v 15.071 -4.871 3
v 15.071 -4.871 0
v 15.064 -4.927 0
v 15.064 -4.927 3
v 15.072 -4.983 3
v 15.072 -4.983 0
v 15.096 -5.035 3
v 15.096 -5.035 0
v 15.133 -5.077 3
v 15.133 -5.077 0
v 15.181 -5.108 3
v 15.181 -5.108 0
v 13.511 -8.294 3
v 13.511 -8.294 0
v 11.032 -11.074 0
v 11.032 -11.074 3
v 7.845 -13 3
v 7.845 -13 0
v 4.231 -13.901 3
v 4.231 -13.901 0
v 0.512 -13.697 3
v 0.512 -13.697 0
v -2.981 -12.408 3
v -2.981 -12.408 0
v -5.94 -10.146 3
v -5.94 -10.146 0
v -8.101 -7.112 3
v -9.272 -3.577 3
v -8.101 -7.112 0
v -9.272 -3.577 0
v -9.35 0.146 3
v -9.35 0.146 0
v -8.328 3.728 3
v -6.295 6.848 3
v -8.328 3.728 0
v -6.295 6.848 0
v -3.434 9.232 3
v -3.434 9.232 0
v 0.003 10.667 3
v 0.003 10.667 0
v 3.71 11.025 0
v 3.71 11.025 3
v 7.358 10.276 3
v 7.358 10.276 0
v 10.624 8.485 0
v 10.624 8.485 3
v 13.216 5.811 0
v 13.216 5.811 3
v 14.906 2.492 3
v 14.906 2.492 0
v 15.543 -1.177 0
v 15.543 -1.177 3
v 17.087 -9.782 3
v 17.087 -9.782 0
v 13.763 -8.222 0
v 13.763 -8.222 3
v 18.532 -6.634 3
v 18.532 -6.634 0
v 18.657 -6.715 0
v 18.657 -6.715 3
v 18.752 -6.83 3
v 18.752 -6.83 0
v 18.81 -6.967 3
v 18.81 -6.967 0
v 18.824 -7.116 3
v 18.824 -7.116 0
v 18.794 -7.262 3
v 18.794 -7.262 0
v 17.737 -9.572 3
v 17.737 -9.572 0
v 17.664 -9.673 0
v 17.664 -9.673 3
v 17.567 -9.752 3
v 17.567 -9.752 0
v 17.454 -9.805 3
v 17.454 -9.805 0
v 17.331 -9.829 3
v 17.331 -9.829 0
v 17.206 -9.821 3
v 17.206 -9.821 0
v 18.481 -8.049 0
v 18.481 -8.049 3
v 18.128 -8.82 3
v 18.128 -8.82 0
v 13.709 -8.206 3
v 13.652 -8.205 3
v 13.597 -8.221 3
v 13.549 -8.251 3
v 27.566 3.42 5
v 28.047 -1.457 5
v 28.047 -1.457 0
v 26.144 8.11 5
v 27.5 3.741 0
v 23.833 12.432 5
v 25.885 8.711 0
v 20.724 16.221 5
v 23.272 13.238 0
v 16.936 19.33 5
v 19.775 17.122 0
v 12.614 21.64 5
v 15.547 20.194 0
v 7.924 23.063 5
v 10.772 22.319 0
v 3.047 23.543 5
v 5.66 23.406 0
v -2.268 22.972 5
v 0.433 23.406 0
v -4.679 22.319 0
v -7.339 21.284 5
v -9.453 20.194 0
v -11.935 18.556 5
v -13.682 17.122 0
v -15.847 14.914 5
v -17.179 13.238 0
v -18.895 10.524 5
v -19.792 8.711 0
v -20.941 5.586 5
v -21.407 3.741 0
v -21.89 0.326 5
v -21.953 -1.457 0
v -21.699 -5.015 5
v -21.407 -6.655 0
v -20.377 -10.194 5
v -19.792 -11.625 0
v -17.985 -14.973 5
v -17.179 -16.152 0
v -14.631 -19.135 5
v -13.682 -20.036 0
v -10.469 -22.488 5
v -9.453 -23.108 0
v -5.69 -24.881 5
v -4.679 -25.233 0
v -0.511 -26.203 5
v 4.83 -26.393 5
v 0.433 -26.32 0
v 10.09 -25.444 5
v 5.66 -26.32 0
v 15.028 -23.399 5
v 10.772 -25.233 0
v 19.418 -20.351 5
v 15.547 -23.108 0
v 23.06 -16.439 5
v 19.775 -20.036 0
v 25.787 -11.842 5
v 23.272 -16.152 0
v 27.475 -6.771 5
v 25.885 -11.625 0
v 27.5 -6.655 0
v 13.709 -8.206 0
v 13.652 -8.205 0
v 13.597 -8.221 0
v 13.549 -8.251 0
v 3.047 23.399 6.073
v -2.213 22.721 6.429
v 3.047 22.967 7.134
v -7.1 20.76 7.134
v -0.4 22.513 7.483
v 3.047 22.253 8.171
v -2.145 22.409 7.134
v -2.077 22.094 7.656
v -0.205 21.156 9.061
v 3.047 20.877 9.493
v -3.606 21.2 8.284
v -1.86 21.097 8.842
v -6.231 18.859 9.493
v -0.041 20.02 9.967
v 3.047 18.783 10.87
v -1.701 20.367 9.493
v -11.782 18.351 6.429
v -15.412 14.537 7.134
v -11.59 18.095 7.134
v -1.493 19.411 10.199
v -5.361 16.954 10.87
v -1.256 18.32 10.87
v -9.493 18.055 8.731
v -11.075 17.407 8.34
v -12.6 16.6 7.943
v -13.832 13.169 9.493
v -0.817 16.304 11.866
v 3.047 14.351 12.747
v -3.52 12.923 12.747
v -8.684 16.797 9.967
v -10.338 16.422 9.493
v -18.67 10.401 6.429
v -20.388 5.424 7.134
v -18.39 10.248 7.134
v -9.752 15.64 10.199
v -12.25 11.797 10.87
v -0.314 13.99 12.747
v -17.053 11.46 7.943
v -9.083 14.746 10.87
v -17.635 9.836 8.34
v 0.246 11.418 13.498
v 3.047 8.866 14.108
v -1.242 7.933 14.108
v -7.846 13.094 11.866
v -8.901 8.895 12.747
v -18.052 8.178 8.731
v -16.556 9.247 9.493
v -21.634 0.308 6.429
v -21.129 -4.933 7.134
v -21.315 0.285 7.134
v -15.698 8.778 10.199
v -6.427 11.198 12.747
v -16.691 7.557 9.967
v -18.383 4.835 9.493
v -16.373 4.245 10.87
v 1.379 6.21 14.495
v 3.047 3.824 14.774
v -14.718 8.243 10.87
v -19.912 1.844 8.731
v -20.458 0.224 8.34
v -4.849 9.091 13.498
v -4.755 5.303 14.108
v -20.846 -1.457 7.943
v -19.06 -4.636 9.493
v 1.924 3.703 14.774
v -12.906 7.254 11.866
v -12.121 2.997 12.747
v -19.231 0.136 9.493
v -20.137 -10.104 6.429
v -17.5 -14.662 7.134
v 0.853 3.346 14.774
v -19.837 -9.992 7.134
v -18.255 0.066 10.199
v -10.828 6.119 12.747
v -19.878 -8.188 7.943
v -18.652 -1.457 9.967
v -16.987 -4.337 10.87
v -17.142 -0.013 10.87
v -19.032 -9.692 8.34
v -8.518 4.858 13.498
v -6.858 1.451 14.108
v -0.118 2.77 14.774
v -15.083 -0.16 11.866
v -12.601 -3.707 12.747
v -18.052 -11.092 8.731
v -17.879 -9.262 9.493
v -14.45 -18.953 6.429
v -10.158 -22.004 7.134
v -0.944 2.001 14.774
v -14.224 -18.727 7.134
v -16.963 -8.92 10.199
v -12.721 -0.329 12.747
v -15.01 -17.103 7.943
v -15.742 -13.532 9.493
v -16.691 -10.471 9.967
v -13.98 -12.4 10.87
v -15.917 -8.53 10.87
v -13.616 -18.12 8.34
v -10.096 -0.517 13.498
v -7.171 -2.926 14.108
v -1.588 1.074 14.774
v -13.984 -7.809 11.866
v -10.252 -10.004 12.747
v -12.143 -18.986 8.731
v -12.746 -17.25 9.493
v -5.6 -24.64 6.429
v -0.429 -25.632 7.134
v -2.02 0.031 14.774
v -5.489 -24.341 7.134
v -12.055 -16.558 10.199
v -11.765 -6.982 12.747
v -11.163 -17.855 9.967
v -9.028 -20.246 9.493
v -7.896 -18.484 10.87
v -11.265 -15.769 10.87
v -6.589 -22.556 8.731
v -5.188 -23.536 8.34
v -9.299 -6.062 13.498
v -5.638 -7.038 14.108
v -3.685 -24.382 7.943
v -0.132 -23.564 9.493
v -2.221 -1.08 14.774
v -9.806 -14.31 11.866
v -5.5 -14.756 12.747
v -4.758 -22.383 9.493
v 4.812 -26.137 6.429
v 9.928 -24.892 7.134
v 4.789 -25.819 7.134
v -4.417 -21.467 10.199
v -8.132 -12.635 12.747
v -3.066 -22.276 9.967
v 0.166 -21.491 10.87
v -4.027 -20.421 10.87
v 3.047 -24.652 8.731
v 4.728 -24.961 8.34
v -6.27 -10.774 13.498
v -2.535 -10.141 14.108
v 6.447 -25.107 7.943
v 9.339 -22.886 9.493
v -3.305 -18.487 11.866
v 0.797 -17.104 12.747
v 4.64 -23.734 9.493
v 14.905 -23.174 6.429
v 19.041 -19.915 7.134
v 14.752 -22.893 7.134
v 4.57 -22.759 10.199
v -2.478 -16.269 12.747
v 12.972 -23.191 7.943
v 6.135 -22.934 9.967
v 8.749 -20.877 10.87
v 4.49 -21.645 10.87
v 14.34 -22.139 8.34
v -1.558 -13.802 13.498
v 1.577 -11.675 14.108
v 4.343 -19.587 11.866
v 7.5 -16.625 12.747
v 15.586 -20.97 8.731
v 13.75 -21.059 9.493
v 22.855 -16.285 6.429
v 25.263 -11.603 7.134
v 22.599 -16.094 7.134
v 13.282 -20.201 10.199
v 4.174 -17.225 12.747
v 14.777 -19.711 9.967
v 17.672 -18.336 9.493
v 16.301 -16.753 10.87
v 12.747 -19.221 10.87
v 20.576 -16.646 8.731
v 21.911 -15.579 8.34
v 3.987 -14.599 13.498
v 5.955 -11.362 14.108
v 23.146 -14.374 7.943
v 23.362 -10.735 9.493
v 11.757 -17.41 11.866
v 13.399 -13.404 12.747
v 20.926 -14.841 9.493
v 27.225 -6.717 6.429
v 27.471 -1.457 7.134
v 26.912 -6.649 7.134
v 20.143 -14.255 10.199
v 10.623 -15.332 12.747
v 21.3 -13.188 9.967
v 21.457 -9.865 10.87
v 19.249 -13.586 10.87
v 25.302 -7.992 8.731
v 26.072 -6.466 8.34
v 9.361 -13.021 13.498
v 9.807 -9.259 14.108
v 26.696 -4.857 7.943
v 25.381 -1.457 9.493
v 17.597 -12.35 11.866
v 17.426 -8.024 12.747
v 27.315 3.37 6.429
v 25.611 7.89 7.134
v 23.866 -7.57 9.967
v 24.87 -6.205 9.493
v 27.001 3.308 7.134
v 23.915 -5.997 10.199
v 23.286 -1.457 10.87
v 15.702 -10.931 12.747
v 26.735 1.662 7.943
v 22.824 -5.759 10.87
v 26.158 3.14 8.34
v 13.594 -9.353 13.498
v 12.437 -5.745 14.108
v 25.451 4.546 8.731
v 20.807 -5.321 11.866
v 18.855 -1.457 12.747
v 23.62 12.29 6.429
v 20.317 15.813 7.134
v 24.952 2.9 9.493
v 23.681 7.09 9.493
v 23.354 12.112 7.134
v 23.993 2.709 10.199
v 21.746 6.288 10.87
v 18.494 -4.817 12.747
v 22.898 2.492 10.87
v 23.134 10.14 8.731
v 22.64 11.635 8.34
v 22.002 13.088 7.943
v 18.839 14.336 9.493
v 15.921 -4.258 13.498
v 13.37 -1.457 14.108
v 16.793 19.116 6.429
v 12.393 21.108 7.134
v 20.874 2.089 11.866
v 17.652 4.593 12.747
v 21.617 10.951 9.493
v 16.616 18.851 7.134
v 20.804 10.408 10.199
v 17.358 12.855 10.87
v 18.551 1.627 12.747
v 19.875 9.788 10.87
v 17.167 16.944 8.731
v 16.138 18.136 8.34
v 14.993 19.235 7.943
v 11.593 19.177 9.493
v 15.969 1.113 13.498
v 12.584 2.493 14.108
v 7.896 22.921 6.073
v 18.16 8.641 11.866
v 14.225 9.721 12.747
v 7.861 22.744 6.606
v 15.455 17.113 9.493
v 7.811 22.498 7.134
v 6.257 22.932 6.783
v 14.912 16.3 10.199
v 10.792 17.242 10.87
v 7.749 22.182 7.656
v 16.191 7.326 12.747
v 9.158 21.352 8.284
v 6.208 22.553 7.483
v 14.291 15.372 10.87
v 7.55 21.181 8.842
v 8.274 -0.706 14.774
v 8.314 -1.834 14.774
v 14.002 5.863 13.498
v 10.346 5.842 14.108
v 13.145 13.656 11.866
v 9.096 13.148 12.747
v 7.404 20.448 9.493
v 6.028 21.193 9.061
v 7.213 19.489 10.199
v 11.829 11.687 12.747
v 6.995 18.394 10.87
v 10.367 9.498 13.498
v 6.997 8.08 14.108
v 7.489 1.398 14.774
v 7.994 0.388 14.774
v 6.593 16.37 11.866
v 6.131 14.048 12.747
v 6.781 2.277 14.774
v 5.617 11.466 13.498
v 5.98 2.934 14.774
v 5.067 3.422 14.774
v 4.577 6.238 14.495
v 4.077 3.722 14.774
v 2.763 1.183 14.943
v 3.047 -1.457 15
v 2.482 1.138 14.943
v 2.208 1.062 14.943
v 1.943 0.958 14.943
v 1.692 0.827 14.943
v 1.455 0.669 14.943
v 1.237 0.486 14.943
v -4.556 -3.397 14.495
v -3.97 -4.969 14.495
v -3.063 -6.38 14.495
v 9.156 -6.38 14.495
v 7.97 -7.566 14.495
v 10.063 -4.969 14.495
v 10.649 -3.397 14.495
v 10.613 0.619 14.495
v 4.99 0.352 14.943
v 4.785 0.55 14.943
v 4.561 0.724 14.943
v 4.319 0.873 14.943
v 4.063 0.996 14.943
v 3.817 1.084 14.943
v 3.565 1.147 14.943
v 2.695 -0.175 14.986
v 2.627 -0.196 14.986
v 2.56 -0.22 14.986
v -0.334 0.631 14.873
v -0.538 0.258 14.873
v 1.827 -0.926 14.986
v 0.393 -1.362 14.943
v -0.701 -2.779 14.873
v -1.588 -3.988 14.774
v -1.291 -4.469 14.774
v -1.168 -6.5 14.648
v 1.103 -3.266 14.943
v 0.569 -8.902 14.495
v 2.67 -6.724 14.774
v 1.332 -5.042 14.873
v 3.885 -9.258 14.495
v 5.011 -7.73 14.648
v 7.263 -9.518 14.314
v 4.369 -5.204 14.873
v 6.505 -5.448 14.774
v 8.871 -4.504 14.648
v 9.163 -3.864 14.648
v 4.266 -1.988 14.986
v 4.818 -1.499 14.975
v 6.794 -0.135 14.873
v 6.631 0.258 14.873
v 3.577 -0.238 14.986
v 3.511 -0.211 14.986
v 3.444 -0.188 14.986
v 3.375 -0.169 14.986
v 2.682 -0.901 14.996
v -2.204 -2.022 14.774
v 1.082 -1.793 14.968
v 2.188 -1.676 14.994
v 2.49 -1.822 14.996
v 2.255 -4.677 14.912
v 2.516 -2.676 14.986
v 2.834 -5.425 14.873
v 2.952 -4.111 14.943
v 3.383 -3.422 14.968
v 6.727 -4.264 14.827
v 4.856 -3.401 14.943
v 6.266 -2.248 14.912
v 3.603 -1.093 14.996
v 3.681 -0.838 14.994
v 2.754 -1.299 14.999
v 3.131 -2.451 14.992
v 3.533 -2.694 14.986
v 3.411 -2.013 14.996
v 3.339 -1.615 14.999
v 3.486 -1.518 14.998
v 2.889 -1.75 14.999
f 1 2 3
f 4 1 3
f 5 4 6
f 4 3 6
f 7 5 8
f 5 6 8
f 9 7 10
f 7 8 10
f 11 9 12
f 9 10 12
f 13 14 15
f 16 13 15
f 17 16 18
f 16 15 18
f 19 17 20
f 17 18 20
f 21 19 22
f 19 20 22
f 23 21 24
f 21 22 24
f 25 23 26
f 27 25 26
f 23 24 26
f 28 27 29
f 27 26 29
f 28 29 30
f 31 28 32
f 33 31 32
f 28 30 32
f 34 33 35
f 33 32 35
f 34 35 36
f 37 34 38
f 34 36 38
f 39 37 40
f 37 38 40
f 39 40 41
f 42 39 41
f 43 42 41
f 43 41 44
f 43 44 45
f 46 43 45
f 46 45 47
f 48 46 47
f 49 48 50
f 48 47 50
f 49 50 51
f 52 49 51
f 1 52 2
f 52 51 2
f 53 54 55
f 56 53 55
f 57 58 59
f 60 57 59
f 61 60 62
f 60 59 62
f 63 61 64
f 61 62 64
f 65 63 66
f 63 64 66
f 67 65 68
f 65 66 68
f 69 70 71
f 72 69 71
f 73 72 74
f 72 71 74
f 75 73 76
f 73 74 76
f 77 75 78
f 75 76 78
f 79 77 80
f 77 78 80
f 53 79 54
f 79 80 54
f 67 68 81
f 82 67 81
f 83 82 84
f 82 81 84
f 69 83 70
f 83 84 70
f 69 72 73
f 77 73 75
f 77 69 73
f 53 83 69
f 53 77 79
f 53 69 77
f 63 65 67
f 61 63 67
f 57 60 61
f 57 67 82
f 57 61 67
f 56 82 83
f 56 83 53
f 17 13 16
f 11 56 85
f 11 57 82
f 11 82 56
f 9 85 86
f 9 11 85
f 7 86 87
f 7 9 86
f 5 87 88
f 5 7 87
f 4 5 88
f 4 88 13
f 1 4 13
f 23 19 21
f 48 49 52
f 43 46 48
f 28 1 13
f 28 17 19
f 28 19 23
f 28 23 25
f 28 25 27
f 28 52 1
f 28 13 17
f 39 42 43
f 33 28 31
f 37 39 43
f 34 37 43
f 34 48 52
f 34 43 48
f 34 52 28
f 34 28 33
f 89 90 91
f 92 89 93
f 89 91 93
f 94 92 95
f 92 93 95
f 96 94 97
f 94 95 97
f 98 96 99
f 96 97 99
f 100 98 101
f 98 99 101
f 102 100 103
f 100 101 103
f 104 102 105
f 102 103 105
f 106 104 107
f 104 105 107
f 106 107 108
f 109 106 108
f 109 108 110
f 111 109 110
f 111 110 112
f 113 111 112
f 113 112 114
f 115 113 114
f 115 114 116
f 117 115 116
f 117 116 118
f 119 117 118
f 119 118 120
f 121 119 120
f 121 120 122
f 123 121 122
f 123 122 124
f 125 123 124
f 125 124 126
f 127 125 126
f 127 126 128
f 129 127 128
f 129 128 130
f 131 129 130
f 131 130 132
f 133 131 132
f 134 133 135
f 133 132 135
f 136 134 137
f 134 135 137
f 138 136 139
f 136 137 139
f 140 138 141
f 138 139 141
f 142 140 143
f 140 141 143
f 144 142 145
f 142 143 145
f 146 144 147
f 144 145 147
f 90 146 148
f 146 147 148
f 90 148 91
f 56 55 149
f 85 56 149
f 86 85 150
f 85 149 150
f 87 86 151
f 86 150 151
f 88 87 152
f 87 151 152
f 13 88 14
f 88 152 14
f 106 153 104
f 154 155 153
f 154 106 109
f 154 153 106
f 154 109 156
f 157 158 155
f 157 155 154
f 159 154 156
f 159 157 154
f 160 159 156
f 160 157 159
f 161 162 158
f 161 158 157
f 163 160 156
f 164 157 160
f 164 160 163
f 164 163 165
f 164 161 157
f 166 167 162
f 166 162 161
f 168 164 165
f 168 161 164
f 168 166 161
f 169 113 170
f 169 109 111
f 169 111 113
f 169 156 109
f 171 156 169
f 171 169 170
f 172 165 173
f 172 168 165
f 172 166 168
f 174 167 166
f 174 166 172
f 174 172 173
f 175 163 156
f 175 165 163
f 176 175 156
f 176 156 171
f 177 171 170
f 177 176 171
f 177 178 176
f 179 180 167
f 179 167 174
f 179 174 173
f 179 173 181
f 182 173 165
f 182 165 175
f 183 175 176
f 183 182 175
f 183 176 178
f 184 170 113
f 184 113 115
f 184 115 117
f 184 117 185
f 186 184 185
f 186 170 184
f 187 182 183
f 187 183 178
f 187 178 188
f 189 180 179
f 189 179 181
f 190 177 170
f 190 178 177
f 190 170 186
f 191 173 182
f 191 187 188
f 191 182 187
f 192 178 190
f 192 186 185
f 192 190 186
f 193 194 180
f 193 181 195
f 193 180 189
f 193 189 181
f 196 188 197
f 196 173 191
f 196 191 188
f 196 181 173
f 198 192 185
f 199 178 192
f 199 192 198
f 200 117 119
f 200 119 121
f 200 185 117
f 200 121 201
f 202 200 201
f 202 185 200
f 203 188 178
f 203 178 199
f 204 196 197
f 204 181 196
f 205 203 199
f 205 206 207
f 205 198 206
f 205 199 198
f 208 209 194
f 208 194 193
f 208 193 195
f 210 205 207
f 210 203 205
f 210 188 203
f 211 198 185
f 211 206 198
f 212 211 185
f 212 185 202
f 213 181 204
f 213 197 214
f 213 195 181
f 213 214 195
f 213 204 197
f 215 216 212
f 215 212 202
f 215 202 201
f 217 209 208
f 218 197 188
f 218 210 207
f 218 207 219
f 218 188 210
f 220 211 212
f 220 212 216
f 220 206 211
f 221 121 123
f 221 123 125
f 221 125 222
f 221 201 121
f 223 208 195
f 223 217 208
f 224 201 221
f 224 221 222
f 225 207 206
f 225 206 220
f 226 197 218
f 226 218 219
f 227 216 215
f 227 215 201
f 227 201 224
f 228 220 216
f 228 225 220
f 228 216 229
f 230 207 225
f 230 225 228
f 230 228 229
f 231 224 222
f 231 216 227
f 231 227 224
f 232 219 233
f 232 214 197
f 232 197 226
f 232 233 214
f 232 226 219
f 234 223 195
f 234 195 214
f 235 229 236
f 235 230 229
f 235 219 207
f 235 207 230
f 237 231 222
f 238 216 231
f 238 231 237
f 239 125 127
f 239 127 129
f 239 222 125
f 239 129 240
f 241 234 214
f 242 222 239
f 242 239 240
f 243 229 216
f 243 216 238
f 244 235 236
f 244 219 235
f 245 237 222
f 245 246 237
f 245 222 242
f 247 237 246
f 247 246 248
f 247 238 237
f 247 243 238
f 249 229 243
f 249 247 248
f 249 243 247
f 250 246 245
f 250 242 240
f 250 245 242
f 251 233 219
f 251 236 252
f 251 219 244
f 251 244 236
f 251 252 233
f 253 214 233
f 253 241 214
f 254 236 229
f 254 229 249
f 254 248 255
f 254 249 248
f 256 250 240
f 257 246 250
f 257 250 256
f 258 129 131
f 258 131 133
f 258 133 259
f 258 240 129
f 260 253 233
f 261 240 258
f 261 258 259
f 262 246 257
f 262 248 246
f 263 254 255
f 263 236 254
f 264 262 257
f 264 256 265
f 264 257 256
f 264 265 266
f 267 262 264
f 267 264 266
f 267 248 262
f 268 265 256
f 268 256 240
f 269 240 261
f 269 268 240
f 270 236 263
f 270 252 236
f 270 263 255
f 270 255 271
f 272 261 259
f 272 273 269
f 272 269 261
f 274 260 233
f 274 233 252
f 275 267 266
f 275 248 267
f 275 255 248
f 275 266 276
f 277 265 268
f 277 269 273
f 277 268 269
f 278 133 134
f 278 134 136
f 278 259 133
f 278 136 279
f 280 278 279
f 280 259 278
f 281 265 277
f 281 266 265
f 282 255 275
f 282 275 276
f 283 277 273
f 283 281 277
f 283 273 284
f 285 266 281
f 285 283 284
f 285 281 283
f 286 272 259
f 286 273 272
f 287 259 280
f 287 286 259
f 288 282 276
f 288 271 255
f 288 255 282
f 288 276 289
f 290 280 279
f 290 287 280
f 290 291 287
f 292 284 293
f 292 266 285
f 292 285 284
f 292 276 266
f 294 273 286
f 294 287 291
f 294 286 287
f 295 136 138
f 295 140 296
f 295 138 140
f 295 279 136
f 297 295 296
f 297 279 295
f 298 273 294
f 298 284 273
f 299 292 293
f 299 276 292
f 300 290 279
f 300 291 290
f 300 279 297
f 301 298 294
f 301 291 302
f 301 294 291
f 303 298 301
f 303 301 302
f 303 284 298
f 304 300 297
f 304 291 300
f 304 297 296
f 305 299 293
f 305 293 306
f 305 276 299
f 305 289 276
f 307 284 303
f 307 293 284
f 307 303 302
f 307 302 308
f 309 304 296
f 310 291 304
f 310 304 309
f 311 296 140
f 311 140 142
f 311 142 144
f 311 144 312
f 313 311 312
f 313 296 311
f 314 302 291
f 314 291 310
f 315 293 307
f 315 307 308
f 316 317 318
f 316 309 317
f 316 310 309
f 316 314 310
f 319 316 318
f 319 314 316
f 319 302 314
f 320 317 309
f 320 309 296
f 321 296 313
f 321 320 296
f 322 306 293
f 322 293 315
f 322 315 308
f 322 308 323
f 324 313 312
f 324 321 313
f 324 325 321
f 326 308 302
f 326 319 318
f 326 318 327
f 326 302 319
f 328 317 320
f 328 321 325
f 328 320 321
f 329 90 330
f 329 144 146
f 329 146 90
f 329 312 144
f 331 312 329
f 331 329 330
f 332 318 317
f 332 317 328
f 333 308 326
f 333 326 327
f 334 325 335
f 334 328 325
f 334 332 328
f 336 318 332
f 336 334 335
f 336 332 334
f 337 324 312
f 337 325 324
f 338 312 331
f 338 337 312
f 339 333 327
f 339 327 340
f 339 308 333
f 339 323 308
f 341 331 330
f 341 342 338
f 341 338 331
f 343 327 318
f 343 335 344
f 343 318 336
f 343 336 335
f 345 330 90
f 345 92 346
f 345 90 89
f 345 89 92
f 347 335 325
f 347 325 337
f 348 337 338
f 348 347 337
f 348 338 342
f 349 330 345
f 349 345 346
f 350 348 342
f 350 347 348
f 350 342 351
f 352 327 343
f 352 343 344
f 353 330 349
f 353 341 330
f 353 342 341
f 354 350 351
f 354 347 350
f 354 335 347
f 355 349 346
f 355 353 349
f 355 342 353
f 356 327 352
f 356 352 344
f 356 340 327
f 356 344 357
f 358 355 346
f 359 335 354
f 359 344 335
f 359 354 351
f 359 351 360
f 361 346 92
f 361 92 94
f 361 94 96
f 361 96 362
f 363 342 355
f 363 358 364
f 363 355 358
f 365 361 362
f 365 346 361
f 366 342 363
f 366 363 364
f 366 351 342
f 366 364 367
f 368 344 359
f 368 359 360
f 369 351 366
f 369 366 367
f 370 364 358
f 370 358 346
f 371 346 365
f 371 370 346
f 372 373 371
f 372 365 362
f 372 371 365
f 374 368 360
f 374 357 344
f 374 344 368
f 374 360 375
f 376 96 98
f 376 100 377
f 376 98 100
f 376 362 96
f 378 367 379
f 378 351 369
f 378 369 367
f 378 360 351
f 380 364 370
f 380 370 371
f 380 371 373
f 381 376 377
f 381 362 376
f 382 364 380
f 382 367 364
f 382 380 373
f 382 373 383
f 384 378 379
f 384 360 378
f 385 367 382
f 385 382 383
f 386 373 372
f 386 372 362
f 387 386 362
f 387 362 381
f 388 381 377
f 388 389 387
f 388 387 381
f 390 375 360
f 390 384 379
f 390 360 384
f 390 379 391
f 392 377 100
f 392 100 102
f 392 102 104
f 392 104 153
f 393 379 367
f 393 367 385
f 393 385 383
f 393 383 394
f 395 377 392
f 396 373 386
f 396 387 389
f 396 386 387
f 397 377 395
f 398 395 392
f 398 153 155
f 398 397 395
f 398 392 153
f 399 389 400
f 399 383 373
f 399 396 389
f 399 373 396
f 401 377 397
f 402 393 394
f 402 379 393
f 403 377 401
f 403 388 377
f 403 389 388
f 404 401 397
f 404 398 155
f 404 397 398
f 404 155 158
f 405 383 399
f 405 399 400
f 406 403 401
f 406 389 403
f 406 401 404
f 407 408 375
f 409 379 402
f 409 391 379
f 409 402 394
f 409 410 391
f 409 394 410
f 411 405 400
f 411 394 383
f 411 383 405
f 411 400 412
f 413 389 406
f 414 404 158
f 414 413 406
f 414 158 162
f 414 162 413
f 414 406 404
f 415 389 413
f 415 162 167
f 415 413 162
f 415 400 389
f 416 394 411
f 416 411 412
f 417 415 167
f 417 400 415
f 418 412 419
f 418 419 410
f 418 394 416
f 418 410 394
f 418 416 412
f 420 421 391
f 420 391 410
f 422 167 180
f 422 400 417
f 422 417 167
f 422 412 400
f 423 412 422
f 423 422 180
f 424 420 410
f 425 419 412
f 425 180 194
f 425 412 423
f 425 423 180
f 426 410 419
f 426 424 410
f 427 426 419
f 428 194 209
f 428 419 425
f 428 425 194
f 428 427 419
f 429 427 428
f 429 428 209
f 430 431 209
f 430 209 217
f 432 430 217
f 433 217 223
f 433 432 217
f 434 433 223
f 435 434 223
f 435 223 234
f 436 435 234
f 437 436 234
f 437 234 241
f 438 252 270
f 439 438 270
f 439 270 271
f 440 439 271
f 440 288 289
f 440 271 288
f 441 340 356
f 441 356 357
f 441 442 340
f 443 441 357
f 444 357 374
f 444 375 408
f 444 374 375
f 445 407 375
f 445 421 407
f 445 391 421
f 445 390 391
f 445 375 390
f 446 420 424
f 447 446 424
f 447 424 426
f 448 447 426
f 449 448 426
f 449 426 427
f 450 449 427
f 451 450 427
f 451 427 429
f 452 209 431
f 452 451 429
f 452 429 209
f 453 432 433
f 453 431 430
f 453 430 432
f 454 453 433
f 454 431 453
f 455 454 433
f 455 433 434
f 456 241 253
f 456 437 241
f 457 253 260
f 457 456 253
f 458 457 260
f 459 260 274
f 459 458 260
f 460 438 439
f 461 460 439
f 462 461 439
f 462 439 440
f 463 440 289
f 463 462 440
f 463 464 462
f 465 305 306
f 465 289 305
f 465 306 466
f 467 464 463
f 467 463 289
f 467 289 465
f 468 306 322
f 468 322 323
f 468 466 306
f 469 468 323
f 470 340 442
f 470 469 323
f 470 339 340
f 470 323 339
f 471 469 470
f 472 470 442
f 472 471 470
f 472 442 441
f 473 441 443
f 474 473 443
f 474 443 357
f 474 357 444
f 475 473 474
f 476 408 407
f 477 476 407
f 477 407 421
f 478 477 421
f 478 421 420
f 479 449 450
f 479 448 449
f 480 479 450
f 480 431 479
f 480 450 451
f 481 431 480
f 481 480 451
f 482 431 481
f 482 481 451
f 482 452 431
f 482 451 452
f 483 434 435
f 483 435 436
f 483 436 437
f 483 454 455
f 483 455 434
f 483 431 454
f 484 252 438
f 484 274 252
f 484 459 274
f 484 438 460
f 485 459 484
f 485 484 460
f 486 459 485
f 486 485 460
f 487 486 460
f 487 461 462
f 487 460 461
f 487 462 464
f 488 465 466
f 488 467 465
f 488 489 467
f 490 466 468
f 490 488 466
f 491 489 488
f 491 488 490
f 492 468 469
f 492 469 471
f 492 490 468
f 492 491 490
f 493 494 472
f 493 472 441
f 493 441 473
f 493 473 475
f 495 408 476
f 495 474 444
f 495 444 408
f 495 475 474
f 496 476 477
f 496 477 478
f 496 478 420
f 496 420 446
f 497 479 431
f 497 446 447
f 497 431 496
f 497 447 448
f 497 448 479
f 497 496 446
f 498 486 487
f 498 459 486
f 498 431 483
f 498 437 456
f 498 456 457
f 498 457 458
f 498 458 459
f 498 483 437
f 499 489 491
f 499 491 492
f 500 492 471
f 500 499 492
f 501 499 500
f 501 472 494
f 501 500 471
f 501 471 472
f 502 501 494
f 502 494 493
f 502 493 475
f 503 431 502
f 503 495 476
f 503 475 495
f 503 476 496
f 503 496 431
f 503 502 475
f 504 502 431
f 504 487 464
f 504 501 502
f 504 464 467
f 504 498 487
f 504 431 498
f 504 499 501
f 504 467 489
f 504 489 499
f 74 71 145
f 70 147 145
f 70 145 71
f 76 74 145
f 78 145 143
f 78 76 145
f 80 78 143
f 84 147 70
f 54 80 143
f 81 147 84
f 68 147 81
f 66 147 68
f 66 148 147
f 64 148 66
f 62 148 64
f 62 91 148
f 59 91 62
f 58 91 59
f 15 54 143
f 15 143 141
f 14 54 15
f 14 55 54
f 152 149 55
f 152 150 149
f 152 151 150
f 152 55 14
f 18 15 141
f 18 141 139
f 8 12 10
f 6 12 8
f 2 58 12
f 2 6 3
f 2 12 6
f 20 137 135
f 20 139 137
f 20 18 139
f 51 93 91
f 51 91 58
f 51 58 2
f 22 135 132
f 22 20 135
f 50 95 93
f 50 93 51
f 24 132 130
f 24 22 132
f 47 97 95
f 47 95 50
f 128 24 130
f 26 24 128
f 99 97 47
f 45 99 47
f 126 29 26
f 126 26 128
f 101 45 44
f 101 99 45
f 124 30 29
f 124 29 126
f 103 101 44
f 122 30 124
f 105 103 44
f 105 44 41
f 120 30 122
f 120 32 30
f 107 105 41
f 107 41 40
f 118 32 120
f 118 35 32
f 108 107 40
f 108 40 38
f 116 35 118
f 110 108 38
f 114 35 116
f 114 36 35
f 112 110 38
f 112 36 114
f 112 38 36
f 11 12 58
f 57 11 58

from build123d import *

# Parameters (mm, degrees)
ESQUISSE3_R             = 25
BOSS_EXTRU_5_DEPTH      = 5
ENL_V_MAT_EXTRU_2_DEPTH = 3
D_ME1_FACE_RADIUS       = 25
D_ME1_HEIGHT            = 10


with BuildPart() as part:
    # Esquisse3 → Boss.-Extru.5 (new body)
    # profile 1 of 2: a face of its own
    with BuildSketch(Plane.XY):
        with Locations((3.046572579, -1.457056451)):
            Circle(ESQUISSE3_R)
        with BuildLine():
            Line((17.087320205, -9.782411277), (13.763402917, -8.222479303))
            ThreePointArc((13.763402917, -8.222479303), (13.623809877, -8.211136397), (13.51100284, -8.294139112))
            ThreePointArc((13.51100284, -8.294139112), (-8.32750686, 3.727566671), (15.071293632, -4.871157152))
            ThreePointArc((15.071293632, -4.871157152), (15.082182303, -5.009778343), (15.180804122, -5.107799435))
            Line((15.180804122, -5.107799435), (18.531758174, -6.633725498))
            ThreePointArc((18.531758174, -6.633725498), (18.786012776, -6.896288595), (18.793687386, -7.261700531))
            ThreePointArc((18.793687386, -7.261700531), (18.309310033, -8.43662399), (17.737416335, -9.571526697))
            ThreePointArc((17.737416335, -9.571526697), (17.454023729, -9.805380714), (17.087320205, -9.782411277))
        make_face(mode=Mode.SUBTRACT)
    # profile 2 of 2: a face of its own
    with BuildSketch(Plane.XY):
        with BuildLine():
            ThreePointArc((13.763402917, -8.222479303), (13.623809877, -8.211136397), (13.51100284, -8.294139112))
            ThreePointArc((13.51100284, -8.294139112), (-8.32750686, 3.727566671), (15.071293632, -4.871157152))
            ThreePointArc((15.071293632, -4.871157152), (15.082182303, -5.009778343), (15.180804122, -5.107799435))
            Line((15.180804122, -5.107799435), (18.531758174, -6.633725498))
            ThreePointArc((18.531758174, -6.633725498), (18.786012776, -6.896288595), (18.793687386, -7.261700531))
            ThreePointArc((18.793687386, -7.261700531), (18.309310033, -8.43662399), (17.737416335, -9.571526697))
            ThreePointArc((17.737416335, -9.571526697), (17.454023729, -9.805380714), (17.087320205, -9.782411277))
            Line((17.087320205, -9.782411277), (13.763402917, -8.222479303))
        make_face()
    extrude(amount=BOSS_EXTRU_5_DEPTH)

    # Esquisse3_4 → Enl_v. mat.-Extru.2 (cut)
    with BuildSketch(Plane.XY):
        with BuildLine():
            ThreePointArc((13.763402917, -8.222479303), (13.623809877, -8.211136397), (13.51100284, -8.294139112))
            ThreePointArc((13.51100284, -8.294139112), (-8.32750686, 3.727566671), (15.071293632, -4.871157152))
            ThreePointArc((15.071293632, -4.871157152), (15.082182303, -5.009778343), (15.180804122, -5.107799435))
            Line((15.180804122, -5.107799435), (18.531758174, -6.633725498))
            ThreePointArc((18.531758174, -6.633725498), (18.786012776, -6.896288595), (18.793687386, -7.261700531))
            ThreePointArc((18.793687386, -7.261700531), (18.309310033, -8.43662399), (17.737416335, -9.571526697))
            ThreePointArc((17.737416335, -9.571526697), (17.454023729, -9.805380714), (17.087320205, -9.782411277))
            Line((17.087320205, -9.782411277), (13.763402917, -8.222479303))
        make_face()
    extrude(amount=ENL_V_MAT_EXTRU_2_DEPTH, mode=Mode.SUBTRACT)

    # D_me1: an elliptical dome of height H over a round flat face of radius A is half a spheroid: the quarter ellipse of half axes A and H revolved about the face's axis
    with BuildSketch(Plane((3.046572579, -1.457056451, 5), x_dir=(0, 1, 0), z_dir=(1, 0, 0)), mode=Mode.PRIVATE) as d_me1_quarter:
        Ellipse(D_ME1_FACE_RADIUS, D_ME1_HEIGHT)
        Rectangle(D_ME1_FACE_RADIUS, D_ME1_HEIGHT, align=(Align.MIN, Align.MIN), mode=Mode.INTERSECT)
    revolve(d_me1_quarter.sketch, axis=Axis((3.046572579, -1.457056451, 5), (0, 0, 1)))


solid = part.part
